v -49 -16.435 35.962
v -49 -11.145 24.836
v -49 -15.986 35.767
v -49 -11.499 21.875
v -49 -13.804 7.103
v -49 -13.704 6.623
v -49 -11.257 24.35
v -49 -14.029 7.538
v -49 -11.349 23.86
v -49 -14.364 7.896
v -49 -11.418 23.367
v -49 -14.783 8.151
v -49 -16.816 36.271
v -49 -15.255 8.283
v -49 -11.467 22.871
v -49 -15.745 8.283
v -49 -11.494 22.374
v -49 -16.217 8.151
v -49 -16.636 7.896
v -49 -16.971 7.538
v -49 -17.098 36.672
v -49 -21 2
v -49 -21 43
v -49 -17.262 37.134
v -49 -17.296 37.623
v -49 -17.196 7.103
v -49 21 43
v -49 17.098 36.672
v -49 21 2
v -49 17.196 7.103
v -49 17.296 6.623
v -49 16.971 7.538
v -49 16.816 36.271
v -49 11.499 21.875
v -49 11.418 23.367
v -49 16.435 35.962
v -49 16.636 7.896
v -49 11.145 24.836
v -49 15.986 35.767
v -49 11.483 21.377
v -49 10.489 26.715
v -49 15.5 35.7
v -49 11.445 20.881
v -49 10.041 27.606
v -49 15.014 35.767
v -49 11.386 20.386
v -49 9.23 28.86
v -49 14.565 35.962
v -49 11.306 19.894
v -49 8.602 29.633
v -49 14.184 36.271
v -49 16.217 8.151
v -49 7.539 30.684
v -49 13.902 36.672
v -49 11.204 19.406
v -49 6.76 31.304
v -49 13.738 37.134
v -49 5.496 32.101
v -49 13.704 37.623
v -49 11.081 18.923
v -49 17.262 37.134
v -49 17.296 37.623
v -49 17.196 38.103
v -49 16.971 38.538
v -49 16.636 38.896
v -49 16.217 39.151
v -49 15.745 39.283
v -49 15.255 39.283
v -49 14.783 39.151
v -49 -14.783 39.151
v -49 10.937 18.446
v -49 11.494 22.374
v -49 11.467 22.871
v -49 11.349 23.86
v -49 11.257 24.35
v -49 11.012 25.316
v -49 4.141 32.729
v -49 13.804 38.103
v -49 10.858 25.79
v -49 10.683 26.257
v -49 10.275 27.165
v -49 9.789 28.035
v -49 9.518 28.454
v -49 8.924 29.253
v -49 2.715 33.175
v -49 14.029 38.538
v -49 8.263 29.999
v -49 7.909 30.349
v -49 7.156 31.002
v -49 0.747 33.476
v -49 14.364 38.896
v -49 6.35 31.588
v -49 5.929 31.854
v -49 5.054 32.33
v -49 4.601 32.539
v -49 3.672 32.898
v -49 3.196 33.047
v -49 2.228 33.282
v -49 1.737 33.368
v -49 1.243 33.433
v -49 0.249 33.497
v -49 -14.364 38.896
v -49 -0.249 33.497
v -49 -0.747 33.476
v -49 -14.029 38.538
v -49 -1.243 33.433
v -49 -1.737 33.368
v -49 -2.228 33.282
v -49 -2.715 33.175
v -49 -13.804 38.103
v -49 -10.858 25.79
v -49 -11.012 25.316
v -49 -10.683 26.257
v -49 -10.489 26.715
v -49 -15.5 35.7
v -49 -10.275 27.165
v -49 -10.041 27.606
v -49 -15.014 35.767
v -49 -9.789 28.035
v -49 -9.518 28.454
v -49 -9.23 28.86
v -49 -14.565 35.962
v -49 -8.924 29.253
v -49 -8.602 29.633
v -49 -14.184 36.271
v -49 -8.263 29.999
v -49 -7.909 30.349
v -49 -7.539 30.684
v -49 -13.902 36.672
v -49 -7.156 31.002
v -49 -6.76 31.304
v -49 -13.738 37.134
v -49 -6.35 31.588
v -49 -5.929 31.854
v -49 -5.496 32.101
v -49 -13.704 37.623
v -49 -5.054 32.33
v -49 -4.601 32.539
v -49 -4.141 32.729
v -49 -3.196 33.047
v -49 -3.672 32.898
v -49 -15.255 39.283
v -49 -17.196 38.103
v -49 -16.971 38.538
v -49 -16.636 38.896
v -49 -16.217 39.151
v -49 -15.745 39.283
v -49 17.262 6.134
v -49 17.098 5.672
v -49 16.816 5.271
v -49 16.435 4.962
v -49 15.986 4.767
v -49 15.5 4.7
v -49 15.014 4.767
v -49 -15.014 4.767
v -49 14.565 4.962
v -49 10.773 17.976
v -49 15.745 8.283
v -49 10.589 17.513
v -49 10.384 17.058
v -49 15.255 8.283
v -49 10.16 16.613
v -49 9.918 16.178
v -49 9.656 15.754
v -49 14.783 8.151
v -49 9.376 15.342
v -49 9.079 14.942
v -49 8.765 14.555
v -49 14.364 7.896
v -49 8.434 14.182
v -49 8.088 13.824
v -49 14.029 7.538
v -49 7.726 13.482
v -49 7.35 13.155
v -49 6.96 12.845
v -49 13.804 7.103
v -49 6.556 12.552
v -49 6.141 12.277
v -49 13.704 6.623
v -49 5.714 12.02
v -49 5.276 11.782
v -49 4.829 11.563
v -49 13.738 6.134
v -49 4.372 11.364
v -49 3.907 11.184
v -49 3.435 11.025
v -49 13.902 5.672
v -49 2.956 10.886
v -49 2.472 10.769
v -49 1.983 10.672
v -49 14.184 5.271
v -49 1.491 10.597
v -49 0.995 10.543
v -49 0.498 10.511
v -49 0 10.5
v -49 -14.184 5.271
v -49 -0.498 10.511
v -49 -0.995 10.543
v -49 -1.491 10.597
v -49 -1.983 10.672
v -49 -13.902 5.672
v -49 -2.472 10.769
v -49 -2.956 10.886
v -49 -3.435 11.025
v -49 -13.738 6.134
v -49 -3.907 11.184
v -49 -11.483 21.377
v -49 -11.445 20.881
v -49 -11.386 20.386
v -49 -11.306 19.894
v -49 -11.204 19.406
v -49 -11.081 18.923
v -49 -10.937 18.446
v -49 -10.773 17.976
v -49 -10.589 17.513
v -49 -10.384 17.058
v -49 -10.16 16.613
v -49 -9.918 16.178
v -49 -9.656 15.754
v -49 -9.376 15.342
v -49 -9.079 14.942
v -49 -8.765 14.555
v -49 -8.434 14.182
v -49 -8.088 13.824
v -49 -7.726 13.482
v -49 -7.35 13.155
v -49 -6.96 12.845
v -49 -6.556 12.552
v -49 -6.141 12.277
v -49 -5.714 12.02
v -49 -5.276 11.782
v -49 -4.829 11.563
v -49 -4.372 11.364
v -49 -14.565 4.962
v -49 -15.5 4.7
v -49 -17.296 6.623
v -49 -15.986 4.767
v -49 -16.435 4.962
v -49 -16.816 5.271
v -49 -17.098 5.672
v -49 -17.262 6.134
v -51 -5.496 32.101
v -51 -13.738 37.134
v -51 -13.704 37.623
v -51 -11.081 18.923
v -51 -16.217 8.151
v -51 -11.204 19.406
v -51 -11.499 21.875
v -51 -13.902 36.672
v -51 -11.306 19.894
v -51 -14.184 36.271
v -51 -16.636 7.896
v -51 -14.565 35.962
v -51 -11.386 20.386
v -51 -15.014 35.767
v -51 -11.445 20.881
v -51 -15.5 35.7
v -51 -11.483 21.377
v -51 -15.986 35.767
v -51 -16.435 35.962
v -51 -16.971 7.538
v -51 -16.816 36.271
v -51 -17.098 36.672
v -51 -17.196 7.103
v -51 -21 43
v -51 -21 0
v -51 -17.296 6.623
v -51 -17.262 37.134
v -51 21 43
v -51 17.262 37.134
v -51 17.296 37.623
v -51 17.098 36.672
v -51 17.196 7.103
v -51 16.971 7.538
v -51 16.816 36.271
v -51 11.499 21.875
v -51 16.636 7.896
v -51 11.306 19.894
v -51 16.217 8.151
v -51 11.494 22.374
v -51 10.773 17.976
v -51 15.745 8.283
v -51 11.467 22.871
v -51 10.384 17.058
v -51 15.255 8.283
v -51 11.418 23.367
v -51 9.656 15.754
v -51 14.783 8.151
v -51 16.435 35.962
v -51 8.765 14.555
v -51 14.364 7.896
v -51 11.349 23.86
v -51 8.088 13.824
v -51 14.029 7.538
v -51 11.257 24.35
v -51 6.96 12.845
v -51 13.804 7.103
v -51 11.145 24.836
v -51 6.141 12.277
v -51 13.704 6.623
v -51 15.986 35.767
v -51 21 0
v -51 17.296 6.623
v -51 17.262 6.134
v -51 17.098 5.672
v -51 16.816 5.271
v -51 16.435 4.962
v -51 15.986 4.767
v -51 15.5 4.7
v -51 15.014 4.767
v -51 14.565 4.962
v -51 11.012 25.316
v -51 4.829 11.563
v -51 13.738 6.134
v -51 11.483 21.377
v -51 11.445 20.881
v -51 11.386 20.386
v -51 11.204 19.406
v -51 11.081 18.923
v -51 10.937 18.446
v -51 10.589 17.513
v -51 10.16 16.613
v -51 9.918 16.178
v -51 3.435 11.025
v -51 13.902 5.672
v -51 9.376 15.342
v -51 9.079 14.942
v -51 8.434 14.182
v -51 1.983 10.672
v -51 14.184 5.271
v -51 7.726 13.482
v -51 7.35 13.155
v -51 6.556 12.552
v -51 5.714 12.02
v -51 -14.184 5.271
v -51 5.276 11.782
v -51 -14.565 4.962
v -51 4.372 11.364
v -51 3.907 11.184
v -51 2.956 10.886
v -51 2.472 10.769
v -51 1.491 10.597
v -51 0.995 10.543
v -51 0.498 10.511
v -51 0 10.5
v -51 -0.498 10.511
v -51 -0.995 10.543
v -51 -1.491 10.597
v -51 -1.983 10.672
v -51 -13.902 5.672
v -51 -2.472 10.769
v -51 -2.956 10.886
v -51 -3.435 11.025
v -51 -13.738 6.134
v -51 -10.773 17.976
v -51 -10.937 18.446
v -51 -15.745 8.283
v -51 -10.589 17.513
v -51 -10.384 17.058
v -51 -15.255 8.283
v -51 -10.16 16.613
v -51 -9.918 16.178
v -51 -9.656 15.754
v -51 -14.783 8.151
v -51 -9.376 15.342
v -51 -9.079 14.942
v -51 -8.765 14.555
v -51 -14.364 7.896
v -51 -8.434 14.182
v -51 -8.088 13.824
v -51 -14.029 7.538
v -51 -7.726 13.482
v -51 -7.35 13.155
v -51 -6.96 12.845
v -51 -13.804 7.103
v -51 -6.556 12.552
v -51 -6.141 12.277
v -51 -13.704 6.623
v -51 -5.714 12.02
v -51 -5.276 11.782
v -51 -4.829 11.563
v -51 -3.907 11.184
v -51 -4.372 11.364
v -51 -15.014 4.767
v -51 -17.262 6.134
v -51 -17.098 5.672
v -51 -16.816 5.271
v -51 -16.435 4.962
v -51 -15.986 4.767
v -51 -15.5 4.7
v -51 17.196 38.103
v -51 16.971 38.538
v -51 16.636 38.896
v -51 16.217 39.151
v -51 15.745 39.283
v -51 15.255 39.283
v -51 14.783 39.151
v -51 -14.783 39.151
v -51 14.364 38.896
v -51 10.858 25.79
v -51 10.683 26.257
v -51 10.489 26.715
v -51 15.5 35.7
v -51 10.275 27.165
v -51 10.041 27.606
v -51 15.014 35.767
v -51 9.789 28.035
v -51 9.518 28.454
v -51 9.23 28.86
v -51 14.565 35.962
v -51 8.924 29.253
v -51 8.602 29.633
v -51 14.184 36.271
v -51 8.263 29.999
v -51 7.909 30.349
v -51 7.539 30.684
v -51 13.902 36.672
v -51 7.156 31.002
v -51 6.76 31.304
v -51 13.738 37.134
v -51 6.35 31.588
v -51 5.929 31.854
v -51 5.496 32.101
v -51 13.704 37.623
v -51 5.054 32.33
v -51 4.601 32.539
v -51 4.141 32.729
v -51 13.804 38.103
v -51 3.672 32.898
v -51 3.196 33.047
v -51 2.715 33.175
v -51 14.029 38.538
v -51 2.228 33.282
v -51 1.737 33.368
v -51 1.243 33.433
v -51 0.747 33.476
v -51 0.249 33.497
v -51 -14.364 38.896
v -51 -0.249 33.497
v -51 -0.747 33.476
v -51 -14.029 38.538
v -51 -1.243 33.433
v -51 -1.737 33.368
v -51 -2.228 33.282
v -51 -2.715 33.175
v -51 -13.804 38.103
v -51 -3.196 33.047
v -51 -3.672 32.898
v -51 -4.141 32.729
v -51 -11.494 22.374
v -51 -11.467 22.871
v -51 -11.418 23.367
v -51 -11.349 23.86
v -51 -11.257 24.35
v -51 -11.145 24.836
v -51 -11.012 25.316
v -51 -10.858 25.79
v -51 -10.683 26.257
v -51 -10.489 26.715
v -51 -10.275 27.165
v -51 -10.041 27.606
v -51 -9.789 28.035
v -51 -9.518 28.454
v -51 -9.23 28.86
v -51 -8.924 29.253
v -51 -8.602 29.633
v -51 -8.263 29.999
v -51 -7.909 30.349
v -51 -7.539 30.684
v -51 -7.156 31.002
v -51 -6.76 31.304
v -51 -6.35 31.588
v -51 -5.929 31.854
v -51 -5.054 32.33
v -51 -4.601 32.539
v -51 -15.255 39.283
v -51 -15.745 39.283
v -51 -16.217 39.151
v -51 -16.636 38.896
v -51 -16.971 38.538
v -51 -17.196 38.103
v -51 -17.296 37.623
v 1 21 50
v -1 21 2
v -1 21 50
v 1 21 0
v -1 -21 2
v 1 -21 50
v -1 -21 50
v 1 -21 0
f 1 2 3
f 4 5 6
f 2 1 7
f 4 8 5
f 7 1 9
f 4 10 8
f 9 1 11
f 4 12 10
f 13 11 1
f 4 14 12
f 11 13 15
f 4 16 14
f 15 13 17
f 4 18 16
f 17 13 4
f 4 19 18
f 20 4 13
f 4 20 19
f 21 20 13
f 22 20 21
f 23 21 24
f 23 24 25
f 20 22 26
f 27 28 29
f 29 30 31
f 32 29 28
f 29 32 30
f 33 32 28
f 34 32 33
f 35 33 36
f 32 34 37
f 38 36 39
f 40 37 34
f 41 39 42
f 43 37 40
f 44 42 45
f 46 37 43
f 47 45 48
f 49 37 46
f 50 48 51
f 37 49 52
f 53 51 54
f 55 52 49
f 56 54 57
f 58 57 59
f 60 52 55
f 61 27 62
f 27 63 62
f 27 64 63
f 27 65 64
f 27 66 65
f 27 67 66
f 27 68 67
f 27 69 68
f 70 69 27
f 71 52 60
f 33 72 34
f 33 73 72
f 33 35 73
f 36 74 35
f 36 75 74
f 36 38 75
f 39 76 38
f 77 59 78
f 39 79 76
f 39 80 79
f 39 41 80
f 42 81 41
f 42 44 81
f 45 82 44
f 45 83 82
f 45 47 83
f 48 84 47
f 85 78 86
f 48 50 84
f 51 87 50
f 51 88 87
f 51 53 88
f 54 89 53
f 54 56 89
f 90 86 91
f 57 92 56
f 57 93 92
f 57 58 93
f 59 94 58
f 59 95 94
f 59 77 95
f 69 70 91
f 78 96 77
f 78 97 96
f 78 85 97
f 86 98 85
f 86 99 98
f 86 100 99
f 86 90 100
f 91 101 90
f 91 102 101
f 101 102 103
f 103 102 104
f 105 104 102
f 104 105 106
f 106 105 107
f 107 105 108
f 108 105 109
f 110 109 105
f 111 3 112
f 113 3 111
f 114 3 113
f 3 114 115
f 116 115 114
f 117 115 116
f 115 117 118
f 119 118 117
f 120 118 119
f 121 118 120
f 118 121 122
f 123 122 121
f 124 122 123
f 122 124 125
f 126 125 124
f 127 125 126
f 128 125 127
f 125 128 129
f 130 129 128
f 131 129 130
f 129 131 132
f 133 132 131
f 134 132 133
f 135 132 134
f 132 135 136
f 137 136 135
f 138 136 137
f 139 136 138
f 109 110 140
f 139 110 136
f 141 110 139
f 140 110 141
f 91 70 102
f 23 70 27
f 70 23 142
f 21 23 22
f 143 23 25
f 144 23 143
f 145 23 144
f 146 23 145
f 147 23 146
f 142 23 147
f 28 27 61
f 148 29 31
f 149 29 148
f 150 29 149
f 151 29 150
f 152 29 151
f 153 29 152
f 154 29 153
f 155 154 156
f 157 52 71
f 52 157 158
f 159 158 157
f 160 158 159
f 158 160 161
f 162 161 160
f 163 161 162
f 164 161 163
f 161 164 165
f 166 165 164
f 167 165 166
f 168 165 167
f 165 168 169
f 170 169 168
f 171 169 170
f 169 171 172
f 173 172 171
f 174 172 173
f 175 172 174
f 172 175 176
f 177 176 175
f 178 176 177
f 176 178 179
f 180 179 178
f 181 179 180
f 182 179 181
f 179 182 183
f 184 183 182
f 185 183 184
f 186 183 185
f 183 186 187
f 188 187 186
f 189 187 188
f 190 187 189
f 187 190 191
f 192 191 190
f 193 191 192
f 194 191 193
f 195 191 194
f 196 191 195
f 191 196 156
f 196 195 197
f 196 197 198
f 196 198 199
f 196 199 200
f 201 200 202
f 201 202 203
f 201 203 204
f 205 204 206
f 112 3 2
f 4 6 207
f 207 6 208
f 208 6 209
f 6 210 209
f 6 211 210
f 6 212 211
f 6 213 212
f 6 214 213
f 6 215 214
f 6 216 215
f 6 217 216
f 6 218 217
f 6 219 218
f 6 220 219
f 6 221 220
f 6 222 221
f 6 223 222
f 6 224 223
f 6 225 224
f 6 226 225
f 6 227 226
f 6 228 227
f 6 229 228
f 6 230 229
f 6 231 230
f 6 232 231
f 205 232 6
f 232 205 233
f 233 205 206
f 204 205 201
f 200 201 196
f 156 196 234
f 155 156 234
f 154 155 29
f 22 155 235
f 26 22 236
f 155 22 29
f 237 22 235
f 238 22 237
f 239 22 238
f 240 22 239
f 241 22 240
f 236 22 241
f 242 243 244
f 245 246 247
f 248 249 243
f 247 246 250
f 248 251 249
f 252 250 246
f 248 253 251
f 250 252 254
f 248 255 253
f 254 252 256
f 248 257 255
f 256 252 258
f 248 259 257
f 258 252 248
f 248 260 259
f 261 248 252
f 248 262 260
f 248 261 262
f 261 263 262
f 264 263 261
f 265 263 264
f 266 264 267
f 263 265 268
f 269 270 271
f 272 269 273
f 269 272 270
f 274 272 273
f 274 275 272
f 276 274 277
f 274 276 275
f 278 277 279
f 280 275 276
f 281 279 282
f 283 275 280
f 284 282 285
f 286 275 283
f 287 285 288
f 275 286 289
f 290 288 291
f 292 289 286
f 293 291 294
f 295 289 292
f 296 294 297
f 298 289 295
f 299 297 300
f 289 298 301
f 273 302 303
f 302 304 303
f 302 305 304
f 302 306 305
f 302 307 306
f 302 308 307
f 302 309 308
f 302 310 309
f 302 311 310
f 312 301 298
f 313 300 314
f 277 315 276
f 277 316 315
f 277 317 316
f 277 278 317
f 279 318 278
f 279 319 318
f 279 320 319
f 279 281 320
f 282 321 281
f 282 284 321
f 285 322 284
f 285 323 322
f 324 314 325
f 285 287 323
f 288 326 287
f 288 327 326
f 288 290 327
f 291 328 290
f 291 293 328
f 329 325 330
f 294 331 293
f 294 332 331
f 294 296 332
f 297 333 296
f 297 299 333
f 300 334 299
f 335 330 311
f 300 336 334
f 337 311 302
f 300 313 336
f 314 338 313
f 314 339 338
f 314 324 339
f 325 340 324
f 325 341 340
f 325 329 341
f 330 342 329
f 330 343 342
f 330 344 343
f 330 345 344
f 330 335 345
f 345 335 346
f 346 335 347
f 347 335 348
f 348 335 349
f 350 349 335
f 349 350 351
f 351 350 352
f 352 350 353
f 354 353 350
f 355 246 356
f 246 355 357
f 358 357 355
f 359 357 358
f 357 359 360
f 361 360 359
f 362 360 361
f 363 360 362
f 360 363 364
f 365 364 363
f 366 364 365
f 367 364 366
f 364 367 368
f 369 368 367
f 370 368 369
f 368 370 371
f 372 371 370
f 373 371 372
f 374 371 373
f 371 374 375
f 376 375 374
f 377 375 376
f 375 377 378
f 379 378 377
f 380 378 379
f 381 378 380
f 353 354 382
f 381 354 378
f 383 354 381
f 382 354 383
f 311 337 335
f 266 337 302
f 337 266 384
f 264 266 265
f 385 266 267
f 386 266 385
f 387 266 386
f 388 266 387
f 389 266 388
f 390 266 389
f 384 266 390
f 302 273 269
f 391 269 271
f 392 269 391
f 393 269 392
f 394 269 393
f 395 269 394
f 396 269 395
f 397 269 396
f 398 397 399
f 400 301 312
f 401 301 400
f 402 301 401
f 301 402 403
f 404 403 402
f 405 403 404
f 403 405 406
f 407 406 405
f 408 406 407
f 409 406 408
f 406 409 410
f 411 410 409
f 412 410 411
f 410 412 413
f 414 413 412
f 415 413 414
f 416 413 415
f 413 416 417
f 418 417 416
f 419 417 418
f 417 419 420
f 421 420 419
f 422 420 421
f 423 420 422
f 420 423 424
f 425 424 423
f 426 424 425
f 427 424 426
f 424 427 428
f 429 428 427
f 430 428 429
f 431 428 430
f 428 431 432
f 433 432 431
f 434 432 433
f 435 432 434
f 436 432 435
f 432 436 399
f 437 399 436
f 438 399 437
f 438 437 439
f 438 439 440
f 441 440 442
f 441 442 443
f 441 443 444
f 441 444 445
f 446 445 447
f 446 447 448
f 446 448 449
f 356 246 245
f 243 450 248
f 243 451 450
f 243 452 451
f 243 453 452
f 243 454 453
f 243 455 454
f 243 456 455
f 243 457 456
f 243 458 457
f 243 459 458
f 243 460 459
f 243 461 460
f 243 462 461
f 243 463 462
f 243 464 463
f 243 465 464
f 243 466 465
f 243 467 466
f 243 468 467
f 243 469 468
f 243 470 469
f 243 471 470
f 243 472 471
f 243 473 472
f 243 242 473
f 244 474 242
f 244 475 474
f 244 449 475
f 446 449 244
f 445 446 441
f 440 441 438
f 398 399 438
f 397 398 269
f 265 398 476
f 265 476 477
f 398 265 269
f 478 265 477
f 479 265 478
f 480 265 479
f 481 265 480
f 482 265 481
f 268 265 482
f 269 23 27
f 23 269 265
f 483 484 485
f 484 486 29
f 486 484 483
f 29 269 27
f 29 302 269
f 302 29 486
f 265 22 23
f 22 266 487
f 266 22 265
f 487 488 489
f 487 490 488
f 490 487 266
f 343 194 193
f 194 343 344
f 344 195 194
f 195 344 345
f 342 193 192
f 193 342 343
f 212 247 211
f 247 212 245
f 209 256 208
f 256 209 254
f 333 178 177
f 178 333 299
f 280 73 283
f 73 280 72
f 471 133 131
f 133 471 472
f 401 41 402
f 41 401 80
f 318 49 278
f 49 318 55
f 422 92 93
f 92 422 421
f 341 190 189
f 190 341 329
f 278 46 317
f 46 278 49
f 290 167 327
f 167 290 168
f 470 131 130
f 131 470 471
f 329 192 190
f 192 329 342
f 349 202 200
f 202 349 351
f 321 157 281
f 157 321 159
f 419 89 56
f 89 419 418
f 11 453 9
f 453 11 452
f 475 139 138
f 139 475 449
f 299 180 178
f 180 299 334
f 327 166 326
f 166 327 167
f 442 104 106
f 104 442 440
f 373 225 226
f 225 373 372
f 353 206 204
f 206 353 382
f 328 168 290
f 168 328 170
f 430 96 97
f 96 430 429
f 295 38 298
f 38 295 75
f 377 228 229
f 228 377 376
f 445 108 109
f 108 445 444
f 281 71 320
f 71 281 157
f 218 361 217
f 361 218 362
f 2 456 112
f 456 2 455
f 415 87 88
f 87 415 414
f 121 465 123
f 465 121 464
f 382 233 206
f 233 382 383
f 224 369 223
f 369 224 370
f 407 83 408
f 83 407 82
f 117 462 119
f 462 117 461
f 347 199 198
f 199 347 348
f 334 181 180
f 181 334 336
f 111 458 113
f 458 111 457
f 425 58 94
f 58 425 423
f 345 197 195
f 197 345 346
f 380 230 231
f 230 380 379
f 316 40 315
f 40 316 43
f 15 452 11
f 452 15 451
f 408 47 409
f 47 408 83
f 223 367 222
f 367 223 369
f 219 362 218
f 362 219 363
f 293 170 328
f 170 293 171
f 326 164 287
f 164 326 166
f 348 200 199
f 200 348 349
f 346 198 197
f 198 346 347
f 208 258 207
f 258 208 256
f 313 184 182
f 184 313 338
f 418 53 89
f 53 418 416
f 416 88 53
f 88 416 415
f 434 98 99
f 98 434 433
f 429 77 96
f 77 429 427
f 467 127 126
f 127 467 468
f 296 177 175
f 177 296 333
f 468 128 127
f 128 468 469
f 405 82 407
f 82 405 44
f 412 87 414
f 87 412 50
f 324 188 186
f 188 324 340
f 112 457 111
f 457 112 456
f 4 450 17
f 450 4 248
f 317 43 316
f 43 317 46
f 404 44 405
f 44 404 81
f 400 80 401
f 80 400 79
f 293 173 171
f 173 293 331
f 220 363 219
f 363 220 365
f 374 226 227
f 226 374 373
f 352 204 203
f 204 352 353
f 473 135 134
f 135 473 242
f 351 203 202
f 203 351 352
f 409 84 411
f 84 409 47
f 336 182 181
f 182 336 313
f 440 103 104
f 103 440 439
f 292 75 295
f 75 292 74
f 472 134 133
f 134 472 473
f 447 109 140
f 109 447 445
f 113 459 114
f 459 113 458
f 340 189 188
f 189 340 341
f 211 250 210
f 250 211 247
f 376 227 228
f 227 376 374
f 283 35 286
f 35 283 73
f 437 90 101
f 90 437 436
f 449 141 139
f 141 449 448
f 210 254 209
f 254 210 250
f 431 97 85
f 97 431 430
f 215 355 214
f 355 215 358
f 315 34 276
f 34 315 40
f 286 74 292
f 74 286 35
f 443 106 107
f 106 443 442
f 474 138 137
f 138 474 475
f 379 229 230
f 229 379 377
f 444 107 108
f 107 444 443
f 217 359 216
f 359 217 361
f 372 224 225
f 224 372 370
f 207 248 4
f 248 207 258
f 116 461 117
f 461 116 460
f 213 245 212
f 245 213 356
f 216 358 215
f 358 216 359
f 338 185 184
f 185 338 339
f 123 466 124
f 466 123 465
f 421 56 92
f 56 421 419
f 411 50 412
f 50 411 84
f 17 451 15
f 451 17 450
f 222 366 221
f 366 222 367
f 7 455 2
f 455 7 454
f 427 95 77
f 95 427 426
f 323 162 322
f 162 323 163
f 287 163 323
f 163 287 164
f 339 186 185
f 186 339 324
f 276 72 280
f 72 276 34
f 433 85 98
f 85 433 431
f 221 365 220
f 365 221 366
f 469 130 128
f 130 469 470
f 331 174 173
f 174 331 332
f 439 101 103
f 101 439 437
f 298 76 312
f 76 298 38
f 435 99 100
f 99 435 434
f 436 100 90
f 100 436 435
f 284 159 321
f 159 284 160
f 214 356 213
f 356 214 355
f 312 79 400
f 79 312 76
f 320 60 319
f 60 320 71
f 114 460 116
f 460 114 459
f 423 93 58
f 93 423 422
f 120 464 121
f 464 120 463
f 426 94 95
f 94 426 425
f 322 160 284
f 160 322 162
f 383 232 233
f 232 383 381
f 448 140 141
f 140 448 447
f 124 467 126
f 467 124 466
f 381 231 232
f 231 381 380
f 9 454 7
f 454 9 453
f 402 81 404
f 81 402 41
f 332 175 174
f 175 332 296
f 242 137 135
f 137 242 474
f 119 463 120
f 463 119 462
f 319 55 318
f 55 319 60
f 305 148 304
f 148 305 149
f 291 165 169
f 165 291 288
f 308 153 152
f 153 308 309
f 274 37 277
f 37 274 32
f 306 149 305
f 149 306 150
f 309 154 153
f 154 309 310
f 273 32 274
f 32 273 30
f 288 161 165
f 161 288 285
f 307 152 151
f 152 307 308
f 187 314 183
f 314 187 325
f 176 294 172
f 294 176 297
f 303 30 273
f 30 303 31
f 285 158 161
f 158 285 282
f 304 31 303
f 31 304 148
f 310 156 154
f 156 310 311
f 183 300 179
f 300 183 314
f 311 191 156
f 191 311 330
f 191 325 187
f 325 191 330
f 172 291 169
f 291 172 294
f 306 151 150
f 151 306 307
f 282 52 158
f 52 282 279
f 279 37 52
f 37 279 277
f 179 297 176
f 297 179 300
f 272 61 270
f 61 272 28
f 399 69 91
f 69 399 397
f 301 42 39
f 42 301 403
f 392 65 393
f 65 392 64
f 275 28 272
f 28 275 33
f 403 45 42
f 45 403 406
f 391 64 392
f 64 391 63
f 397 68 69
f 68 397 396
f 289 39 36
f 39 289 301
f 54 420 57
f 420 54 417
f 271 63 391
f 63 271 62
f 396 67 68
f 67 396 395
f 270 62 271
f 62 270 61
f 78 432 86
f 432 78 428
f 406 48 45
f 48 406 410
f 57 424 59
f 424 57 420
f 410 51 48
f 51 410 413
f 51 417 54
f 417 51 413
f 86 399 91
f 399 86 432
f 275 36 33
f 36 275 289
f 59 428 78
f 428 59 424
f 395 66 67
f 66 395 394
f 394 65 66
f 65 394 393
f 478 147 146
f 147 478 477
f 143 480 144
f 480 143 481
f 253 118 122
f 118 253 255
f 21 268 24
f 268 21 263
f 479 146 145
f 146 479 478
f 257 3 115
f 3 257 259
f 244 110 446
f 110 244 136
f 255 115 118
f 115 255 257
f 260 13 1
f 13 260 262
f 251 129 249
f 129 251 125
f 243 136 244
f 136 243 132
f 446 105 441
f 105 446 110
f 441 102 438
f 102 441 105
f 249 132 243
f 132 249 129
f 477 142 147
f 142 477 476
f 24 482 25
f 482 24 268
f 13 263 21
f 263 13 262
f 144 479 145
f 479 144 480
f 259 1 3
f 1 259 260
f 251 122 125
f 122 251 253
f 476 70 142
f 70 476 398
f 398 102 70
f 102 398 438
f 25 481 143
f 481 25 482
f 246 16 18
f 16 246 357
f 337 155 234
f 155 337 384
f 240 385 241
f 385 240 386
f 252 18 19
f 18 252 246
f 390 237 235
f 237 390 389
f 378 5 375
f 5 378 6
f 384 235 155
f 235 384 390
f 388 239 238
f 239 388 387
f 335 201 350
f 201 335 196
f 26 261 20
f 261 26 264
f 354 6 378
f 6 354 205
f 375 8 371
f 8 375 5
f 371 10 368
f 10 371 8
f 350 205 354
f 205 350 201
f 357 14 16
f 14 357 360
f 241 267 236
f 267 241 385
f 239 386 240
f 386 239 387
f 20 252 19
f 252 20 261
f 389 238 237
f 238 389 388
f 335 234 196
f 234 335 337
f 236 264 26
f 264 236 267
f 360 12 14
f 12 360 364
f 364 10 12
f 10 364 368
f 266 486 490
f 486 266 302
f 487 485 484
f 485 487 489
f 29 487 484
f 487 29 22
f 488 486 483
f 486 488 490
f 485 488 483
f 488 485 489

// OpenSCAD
//design and code by emanresu (http://www.thingiverse.com/Emanresu)
//generates clampable mounts for a NEMA 17 syle stepper motor



   //////////////////
  //  Parameters  //
 //////////////////

/* [Global] */

//Clamp Type
type = "180 degree";//[90 degree, 180 degree, 45 degree, Multi]
//Clamp Thickness (mm)
thick = 2;
//Shaft height (mm)
shaft_height = 21;// 21:10000000
//width of clamp base (mm);
width=42; //42:10000000
//do you want the motor plate the same width as the clamp?
mount_flush="yes";//[yes,no]
//how do you want the motor mount justified with respect to the clamp?
//length of 90º base of clamp (mm)
base_1 = 50;
//length of 180º or 45º base of clamp (mm)
base_2 = 50;
//length of 180º base in multi-clamp (mm)
base_3 = 30;


/* [Hidden] */

//Sets openSCAD resolution for nice round holes
$fa=1;
$fs=0.5;

//NEMA 17 Parameters
Nema_square = 42;
Nema_hole_offset = 31;
Nema_mount_hole_diameter = 3.6;//clearance for M3 screws
Nema_center_hole_diameter = 23;

Nema_mount_hole_radius = Nema_mount_hole_diameter/2;
Nema_center_hole_radius = Nema_center_hole_diameter/2;


   ///////////////
  //  Modules  //
 ///////////////

module NEMA17_plate() {
	// Generates mounting plate  with the necessary clearance holes for a NEMA 17 style motor
	
	difference() {
		//plate body
		cube(size=[Nema_square, Nema_square, thick], center=true);
		
		//center hole
		cylinder(r=Nema_center_hole_radius, h=thick+2, center=true);
		
		//clearance holes for M3 screws
		translate([Nema_hole_offset/2, Nema_hole_offset/2, 0]) {
			cylinder(r=Nema_mount_hole_radius, h=thick+1, center=true);
		} 
		translate([-Nema_hole_offset/2, Nema_hole_offset/2, 0]) {
			cylinder(r=Nema_mount_hole_radius, h=thick+1, center=true);
		}
		translate([-Nema_hole_offset/2, -Nema_hole_offset/2, 0]) {
			cylinder(r=Nema_mount_hole_radius, h=thick+1, center=true);
		}
		translate([Nema_hole_offset/2, -Nema_hole_offset/2, 0]) {
			cylinder(r=Nema_mount_hole_radius, h=thick+1, center=true);
		}
	}
}


module 90deg_clamp() {
	// makes a simple 90º clamp for a NEMA 17 style motor
	
	//defines spacer for shaft_height parameter
	//sets minimum value allowed for shaft height
	delta = (shaft_height >= 21 ? abs(shaft_height-Nema_square/2) : 0);
	
	//sets minimum value allowed for the base width
	base_width = (width - Nema_square > 0 ? width : Nema_square);
	
	//determines if mount plate is flush with the rest of the clamp
	test_width = (mount_flush == "yes" ? (abs(width-Nema_square)/2) : 0);
	ex_width = (width-Nema_square > 0 ? test_width : 0);

	union() {
		//joining the parts of the clamp together
		translate([-21-delta, 0, thick/2]) {
			//positions motor mount
			NEMA17_plate();
		}
		translate([-delta/2, 0, thick/2]) {
			//spacer for motor height
			cube(size=[delta, 42, thick], center=true);
		}
		translate([-(42+delta)/2, 21+ex_width/2, thick/2]) {
			//wings for making plate flush
			cube(size=[42+delta, ex_width, thick], center=true);
		}
		translate([-(42+delta)/2, -21-ex_width/2, thick/2]) {
			//wings for making plate flush
			cube(size=[42+delta, ex_width, thick], center=true);
		}
		translate([0, 0, base_1/2]) {
			//90º clamp base
			cube(size=[thick, base_width, base_1], center=true);
		}
	}
}


module 180deg_clamp() {
	// makes a simple 180º clamp for a NEMA 17 style motor
	
	union() {
		//joins 90º clamp with an additional base to make the 180º clamp
		translate([-base_1-thick/2, 0, thick/2]) {
			rotate([0, 90, 0]) {
				//reorients the 90º clamp so the 180º clamp is printable
				90deg_clamp();
			}
		}
		translate([0, 0, base_2/2]) {
			//adding the 180º base to the clamp
			cube(size=[thick, width, base_2], center=true);
		}
	}	
}


module 45deg_clamp() {
	// makes a simple 45º clamp for a NEMA 17 style motor
	
	translate([0, 0, width/2]) rotate([-90, 0, 0]) {
		//Positions clamp for printing
		union() {
			//joins 90º clamp with an additional base to make the 45º clamp
			translate([-base_1, 0, thick/2]) {
				rotate([0, 90, 0]) {
					90deg_clamp();
				}
			}
			rotate([0, -45, 0]) {
				//adding the 45º base to the clamp
				translate([base_2/2, 0, thick/2]) {
					cube(size=[base_2, width, thick], center=true);
				}
			}	
		}
	}	
}


module Multi_clamp() {
	// makes a multi clamp (one with 45º, 90º and 180º clamping surfaces) for a NEMA 17 style motor
	
	beta = base_2*sin(45);
	
	union() {
		//joins a 45º clamp with an additional base to make the multi clamp
		45deg_clamp();

		translate([beta-thick, beta, 0]) {
			//adding the 180º base to the multi-clamp
			cube(size=[thick, base_3, width], center=false);
		}
	}	
}


   ////////////////////
  //  Control Code  //
 ////////////////////



if (type == "90 degree") {
	90deg_clamp();
}
if (type == "45 degree") {
	45deg_clamp();
}
if (type == "180 degree") {
	180deg_clamp();
}
if (type == "Multi") {
	Multi_clamp();
}
 
